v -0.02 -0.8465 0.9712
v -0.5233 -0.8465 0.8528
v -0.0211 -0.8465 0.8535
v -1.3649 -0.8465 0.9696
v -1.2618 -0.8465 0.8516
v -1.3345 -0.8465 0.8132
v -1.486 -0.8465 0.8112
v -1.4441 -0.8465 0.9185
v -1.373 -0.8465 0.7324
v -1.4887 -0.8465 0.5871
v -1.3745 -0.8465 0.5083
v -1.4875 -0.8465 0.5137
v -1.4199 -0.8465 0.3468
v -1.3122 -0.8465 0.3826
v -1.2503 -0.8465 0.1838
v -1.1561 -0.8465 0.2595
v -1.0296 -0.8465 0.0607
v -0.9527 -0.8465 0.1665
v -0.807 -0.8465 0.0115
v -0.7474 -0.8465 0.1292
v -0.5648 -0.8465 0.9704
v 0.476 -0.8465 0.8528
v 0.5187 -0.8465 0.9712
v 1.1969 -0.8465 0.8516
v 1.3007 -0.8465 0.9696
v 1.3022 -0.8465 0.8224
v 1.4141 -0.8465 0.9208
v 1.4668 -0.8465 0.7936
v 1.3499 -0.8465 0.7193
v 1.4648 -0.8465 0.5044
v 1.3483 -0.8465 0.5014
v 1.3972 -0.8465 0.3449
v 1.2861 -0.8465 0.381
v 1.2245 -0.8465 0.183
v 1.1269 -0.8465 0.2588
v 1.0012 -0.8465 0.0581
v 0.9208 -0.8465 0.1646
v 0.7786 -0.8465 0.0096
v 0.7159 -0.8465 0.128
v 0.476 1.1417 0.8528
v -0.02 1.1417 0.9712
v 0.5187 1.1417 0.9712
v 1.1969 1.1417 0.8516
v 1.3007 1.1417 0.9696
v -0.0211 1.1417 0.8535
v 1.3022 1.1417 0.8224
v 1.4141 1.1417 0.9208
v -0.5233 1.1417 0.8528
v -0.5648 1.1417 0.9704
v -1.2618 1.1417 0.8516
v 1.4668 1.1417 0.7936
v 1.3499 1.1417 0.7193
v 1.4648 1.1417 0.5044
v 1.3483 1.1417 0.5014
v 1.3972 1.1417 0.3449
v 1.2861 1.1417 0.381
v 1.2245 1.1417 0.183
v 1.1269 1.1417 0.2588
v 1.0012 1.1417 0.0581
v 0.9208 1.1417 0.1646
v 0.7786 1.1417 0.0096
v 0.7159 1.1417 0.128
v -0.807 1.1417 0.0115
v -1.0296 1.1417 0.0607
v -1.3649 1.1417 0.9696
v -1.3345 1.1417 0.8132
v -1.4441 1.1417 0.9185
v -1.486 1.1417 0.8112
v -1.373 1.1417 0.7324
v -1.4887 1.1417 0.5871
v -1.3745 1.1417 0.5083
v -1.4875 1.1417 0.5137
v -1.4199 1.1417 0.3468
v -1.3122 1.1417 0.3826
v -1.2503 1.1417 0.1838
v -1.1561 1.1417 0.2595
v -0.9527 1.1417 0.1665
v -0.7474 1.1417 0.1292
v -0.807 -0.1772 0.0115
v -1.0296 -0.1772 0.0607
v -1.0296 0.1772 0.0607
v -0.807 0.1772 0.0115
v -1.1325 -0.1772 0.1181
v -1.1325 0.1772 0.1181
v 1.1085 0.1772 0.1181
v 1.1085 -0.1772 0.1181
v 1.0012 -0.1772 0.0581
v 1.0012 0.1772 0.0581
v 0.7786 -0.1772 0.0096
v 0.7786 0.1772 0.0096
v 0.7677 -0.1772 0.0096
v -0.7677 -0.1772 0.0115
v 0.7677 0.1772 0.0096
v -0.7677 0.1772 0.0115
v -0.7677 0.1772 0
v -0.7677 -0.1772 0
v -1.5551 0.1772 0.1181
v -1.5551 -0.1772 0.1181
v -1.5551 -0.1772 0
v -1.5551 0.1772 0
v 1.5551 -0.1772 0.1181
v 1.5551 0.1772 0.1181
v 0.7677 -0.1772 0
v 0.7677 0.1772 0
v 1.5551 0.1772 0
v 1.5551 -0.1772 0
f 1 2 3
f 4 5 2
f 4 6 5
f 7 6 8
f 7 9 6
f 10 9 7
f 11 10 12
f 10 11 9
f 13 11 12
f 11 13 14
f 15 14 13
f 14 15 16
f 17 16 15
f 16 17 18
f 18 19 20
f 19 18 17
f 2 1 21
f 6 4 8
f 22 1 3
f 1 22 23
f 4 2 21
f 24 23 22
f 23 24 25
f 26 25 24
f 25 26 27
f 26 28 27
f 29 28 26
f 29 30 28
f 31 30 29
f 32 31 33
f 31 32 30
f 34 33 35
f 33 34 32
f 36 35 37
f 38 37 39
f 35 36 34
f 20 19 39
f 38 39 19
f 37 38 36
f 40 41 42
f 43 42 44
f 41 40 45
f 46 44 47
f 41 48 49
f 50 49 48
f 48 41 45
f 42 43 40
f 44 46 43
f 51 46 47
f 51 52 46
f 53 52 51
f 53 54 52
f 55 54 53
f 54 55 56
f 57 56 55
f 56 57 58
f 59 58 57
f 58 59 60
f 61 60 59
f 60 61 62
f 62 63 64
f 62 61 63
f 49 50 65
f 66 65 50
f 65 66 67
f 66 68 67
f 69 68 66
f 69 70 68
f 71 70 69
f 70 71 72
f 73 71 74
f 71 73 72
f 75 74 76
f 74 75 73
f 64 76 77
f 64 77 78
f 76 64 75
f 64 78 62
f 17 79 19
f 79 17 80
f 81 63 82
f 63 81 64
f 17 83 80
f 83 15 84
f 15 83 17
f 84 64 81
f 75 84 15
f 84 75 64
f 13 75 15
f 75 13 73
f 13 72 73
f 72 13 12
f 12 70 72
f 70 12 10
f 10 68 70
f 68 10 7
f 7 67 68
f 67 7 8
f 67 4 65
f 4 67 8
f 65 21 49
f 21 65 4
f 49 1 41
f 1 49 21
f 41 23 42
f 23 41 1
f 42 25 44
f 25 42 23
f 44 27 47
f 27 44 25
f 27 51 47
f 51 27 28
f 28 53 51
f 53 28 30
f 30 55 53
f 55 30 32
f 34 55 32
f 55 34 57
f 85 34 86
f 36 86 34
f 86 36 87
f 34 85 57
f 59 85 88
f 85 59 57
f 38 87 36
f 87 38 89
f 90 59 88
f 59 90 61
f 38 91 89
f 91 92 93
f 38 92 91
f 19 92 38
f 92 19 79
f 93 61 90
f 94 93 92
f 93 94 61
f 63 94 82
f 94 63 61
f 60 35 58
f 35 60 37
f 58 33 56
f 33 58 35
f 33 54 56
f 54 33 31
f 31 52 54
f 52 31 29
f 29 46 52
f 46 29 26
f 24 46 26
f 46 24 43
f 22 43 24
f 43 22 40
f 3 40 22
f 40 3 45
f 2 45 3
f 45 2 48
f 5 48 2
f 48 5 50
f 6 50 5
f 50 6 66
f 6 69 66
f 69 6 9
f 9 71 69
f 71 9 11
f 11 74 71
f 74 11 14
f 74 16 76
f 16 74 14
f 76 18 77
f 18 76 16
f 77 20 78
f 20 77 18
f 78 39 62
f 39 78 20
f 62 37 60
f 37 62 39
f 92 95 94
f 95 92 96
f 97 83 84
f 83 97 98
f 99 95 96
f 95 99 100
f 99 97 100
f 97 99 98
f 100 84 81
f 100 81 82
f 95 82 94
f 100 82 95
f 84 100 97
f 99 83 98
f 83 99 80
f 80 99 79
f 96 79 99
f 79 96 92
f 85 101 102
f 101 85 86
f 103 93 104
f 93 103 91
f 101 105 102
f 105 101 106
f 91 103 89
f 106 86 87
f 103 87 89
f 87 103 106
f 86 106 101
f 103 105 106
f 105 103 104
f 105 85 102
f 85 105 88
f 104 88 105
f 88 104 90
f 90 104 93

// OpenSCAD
// file: defines.scad
// example012.stl is Mblock.stl, (c) 2009 Will Langford
// licensed under the Creative Commons - GNU GPL license.
// http://www.thingiverse.com/thing:753

//import("sim800c.stl", convexity=3);

// PCB

$fn = 64;

scale = 1/2.54;
// main file
include <defines.scad>

// Толщина металла.
Wh = 0.3;

// Внутренний размер
Win = 6.9;
Hin = 1.85;

// Длина ровной части
L = 5.05;

// Смещение относительно оси координат
Loff = 2.15;

scale(scale) color("Gray") {
  /*cube([7.5, 5.05, 2.80], center = true);*/

  /*translate([0,0,-Loff])
  linear_extrude(height = L, center = false)
    polygon([
      [-Win/2, Hin/2],
      [ Win/2, Hin/2],
      [ Win/2, -Hin/2],
      [-Win/2, -Hin/2]
    ]);*/
  rotate([90, 0, 180])
  translate([-7.5/2, 0, -Loff])
  linear_extrude(height = L, center = false, convexity = 10)
    import (file = "cover-shape1.dxf");


  translate([-7.90/2, -0.9/2, 0]) cube([2.0, 0.9, 0.3], center=false);
  mirror([1,0,0]) translate([-7.90/2, -0.9/2, 0]) cube([2.0, 0.9, 0.3], center=false);

}
